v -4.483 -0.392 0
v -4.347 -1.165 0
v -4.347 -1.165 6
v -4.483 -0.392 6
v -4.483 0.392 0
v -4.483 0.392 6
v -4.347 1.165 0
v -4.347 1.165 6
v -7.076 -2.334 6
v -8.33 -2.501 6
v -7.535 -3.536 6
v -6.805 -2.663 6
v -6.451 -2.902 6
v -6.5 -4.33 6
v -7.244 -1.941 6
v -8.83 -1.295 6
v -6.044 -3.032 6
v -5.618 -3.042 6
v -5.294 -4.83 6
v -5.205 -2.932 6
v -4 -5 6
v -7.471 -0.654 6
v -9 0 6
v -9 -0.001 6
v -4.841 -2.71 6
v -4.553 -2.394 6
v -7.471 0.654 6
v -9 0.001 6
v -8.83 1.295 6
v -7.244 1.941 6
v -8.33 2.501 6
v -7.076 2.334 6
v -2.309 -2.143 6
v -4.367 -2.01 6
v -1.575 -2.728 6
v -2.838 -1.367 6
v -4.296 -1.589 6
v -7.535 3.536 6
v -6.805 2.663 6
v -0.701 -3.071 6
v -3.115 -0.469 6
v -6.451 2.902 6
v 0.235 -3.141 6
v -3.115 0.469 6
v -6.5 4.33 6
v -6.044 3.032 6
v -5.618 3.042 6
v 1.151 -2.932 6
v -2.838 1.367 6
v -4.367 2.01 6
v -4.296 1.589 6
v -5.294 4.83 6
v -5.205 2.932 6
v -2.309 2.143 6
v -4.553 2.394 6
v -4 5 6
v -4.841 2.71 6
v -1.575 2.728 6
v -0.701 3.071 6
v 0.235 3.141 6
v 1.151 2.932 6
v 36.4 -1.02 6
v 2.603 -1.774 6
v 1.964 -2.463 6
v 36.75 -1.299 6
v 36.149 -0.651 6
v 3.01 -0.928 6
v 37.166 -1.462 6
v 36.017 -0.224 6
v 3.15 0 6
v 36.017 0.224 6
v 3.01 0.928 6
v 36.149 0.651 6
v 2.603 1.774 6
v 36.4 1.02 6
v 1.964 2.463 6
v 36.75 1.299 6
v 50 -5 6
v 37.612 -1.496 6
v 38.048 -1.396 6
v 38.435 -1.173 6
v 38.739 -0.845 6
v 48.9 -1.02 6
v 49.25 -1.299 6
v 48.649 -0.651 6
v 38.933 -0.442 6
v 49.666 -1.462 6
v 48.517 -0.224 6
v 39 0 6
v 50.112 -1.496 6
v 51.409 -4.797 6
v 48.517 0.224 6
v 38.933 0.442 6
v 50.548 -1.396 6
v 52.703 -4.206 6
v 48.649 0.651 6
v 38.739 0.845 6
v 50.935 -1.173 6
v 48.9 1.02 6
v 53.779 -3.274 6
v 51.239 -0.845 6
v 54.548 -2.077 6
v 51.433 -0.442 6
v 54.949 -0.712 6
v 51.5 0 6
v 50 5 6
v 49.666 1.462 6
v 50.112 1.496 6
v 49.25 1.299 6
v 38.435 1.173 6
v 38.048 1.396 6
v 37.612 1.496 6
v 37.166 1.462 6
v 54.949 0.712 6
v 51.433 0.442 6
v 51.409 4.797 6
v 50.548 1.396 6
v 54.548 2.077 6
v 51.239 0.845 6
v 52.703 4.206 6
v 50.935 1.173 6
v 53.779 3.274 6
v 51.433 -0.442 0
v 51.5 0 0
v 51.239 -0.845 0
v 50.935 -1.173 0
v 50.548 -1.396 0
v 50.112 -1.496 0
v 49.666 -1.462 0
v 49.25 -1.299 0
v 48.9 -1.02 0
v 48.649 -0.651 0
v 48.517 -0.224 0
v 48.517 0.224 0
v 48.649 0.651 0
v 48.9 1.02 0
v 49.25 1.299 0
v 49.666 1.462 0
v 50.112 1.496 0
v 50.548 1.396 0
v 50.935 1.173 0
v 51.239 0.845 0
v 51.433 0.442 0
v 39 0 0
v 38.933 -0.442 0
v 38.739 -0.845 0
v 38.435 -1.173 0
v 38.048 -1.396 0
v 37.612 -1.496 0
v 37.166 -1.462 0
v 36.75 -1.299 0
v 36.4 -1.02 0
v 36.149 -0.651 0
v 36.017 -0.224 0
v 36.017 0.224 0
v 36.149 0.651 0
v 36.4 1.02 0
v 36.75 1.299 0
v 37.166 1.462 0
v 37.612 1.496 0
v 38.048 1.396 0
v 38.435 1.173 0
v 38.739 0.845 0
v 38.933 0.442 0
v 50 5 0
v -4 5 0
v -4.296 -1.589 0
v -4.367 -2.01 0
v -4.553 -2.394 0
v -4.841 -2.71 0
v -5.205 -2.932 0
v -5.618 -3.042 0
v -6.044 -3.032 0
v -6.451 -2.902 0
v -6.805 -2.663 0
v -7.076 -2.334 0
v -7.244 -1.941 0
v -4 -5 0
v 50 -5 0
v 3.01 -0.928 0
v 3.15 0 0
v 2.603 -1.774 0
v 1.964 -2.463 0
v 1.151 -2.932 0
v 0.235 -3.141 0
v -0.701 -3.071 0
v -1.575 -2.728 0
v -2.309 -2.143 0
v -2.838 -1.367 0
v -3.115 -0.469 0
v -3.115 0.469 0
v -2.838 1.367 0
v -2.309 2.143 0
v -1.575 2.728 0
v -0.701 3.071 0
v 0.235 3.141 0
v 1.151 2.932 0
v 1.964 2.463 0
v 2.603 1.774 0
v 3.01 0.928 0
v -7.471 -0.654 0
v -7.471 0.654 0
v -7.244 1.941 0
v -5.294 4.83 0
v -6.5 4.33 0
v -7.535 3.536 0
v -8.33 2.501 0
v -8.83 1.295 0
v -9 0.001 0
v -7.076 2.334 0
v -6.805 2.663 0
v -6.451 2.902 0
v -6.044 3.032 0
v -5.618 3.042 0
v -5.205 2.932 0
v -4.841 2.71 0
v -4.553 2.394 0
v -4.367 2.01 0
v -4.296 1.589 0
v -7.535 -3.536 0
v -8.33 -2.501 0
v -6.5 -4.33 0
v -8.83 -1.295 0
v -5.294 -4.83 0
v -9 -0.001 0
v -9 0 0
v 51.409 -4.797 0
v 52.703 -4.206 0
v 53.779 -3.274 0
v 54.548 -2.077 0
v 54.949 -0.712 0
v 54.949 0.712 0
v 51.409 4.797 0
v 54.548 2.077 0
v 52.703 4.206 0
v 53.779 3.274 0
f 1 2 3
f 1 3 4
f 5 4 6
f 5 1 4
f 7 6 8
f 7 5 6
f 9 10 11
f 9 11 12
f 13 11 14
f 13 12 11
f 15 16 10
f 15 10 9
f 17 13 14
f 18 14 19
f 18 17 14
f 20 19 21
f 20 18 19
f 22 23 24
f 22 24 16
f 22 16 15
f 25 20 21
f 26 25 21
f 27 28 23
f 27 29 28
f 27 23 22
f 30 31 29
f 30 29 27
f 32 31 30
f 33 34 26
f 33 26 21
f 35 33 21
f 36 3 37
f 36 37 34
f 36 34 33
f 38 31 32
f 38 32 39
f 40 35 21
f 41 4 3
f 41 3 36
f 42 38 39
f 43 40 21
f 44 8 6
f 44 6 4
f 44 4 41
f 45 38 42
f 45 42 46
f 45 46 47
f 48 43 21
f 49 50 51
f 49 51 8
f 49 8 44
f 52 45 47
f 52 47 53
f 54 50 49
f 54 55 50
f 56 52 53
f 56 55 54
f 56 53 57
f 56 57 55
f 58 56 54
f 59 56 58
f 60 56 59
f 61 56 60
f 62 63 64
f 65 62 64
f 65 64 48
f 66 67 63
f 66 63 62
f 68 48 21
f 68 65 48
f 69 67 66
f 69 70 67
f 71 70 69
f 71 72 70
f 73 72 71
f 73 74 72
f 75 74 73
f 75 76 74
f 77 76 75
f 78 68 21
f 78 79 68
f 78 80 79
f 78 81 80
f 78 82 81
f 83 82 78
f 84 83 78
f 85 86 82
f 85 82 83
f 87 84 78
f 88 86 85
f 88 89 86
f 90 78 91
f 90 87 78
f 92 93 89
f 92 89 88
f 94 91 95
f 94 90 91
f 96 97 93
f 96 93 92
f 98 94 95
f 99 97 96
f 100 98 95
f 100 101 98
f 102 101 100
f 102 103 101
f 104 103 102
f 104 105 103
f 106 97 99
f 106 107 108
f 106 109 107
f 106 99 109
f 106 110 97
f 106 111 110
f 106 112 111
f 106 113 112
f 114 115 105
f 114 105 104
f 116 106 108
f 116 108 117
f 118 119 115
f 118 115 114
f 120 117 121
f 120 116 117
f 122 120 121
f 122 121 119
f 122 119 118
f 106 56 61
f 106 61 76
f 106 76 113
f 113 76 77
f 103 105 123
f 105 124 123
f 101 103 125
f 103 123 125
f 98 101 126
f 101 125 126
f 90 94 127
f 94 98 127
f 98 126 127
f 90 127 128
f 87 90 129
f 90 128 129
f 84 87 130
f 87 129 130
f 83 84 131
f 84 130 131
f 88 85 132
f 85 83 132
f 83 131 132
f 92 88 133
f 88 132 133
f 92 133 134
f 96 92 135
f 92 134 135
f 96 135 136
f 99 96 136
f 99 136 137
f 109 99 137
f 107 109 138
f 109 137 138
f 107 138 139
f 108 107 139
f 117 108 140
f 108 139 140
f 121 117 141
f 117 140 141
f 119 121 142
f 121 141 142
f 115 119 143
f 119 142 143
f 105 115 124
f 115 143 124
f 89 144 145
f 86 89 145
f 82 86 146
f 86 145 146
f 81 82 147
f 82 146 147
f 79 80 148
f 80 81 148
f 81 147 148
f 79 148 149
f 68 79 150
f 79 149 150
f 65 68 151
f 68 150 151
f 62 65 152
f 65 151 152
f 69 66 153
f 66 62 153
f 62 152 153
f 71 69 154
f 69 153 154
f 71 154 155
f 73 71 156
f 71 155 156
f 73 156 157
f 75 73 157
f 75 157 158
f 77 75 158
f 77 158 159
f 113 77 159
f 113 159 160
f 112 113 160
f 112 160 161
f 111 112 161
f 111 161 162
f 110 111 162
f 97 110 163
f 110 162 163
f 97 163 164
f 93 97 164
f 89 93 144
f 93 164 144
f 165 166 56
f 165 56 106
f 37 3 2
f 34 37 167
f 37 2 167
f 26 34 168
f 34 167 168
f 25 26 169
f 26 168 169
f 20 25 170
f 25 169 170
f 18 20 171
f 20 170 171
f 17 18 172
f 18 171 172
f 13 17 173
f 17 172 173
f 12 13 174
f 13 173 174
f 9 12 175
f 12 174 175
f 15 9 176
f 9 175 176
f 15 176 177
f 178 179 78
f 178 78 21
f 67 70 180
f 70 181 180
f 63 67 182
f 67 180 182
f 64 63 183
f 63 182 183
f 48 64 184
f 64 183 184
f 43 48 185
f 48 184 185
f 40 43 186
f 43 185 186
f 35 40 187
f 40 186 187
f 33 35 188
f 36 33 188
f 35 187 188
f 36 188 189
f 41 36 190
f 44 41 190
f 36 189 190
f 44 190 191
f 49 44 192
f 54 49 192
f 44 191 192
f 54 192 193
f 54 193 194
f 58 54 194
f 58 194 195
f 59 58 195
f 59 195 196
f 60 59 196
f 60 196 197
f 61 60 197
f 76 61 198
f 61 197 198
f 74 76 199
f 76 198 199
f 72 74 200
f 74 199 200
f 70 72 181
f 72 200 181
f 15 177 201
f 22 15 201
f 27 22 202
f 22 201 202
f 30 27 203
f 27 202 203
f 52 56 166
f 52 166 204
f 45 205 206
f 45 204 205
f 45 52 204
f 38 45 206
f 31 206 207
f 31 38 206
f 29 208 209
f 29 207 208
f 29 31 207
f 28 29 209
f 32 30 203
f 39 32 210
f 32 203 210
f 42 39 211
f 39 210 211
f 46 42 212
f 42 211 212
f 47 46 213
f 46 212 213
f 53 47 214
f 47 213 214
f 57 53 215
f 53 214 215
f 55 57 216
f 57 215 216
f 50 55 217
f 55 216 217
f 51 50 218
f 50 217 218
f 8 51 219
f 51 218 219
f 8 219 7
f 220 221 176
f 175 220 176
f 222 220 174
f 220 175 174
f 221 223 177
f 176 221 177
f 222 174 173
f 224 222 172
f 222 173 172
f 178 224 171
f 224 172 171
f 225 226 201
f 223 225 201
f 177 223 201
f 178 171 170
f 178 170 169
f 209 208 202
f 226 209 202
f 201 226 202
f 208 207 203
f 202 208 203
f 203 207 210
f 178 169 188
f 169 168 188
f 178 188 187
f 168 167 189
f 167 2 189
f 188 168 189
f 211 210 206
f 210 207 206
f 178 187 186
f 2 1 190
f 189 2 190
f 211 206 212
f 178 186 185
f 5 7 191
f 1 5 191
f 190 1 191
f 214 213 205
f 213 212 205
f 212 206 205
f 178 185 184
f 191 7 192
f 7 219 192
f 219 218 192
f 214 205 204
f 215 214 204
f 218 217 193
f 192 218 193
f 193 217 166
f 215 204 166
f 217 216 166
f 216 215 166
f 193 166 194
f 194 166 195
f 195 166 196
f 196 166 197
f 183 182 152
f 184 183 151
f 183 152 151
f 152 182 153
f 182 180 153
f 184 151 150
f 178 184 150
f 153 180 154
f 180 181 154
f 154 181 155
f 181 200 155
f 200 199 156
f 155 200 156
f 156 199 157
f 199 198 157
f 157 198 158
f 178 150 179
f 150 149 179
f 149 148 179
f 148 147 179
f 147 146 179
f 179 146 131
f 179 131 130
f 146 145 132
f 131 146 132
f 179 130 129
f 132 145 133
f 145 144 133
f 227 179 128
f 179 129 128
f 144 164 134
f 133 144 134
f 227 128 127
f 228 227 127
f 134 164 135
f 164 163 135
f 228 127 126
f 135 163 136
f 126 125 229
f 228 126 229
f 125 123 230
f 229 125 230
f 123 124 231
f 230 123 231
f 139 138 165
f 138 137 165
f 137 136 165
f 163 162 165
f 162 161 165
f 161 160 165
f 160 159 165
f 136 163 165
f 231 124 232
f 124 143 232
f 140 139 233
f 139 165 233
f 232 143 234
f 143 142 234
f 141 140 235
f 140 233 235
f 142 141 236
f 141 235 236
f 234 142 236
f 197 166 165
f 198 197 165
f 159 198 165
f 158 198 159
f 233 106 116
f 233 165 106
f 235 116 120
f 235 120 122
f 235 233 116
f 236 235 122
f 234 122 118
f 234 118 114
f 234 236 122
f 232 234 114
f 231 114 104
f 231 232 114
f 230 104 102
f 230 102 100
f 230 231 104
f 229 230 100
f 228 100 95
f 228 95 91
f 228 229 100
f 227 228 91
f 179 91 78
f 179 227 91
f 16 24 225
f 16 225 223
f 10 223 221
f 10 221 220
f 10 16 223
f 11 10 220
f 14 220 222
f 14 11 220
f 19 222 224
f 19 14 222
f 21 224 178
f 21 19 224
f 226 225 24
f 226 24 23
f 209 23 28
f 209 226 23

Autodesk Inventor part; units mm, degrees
ref_plane "YZ Plane" through (0, 0, 0) normal (1, 0, 0) x (0, 1, 0)
ref_plane "XZ Plane" through (0, 0, 0) normal (0, 1, 0) x (-1, 0, 0)
ref_plane "XY Plane" through (0, 0, 0) normal (0, 0, 1) x (1, 0, 0)
sketch "Sketch1" plane through (0, 0, 0) normal (0, 0, 1) x (1, 0, 0)
  circle A0 centre (0, 0) radius 3.15
  line L0 (0, 0) -> (50, 0) construction
  line L1 (0, -9) -> (50, -9)
  line L2 (50, 9) -> (0, 9)
  arc A1 (0, 9) -> (0, -9) centre (0, 0) ccw
  arc A2 (50, -9) -> (50, 9) centre (50, 0) ccw
  line L3 (0, 0) -> (50, 0) construction
  circle A3 centre (50, 0) radius 1.5
  circle A4 centre (37.5, 0) radius 1.5
  circle A5 centre (-5.7956, -1.5529) radius 1.5
  circle A6 centre (-5.7956, 1.5529) radius 1.5
  line L4 (0, 0) -> (-5.7956, 1.5529) construction
  line L5 (0, 0) -> (-5.7956, -1.5529) construction
  line L6 (0, 0) -> (-9, 0) construction
  arc A7 (-4.3467, 1.1647) -> (-4.3467, -1.1647) centre (0, 0) ccw
  arc A8 (-7.2444, 1.9411) -> (-7.2444, -1.9411) centre (0, 0) ccw
  line L7 (-1.8674, 2.5368) -> (1.2741, 2.8808)
  point P0 (25, 0)
  dimension "d0" = 6.3
  dimension "d1" = 50
  dimension "d2" = 0
  dimension "d3" = 18
  dimension "d4" = 3
  dimension "d5" = 3
  dimension "d6" = 12.5
  dimension "d7" = 3
  dimension "d8" = 3
  dimension "d9" = 15
  dimension "d10" = 15
  dimension "d12" = 6
  dimension "d15" = 2.725
  dimension "d16" = -6.25
  dimension "d17" = 6
extrude "Extrusion1" add sketch "Sketch1" along normal blind 6
sketch "Sketch2" plane through (0, 0, 0) normal (0, 0, -1) x (-1, 0, 0)
  arc A0 (-50, 9) -> (-50, -9) centre (-50, 0) ccw projected
  line L0 (0, -9) -> (-50, -9) projected
  arc A1 (0, -9) -> (0, 9) centre (0, 0) ccw projected
  line L1 (-50, 9) -> (0, 9) projected
  circle A2 centre (-37.5, 0) radius 1.5 projected
  arc A3 (7.2444, -1.9411) -> (7.2444, 1.9411) centre (0, 0) ccw projected
  arc A4 (4.3467, -1.1647) -> (7.2444, -1.9411) centre (5.7956, -1.5529) ccw projected
  arc A5 (4.3467, -1.1647) -> (4.3467, 1.1647) centre (0, 0) ccw projected
  arc A6 (7.2444, 1.9411) -> (4.3467, 1.1647) centre (5.7956, 1.5529) ccw projected
  circle A7 centre (-50, 0) radius 1.5 projected
  circle A8 centre (0, 0) radius 3.15 projected
  line L2 (9, 5) -> (-59, 5)
  line L3 (-59, 5) -> (-59, -5)
  line L4 (-59, -5) -> (9, -5)
  line L5 (9, -5) -> (9, 5)
  circle A9 centre (-50, 0) radius 5
  point P0 (7.4833, -5)
  point P1 (-50, -5)
  point P2 (-50, 5)
  point P3 (7.4833, 5)
  dimension "d18" = 5
  dimension "d19" = 10
  dimension "d20" = 9
  dimension "d21" = 59
extrude "Extrusion2" cut sketch "Sketch2" against normal blind 6 contours L1 A1 L2 A0 | L2 A9 L4 A0 | L4 A1 L0 A0
fillet "Fillet1" radius 5 2 edges at (-7.4833, 5, 3) (-7.4833, -5, 3)
sketch "Sketch3" plane through (0, 0, 6) normal (0, 0, 1) x (1, 0, 0)
  circle A0 centre (0, 0) radius 3.15 projected
  circle A1 centre (50, 0) radius 1.5 projected
  arc A2 (-7.2444, 1.9411) -> (-7.2444, -1.9411) centre (0, 0) ccw projected
  arc A3 (-4.3467, 1.1647) -> (-7.2444, 1.9411) centre (-5.7956, 1.5529) ccw projected
  arc A4 (-4.3467, 1.1647) -> (-4.3467, -1.1647) centre (0, 0) ccw projected
  arc A5 (-7.2444, -1.9411) -> (-4.3467, -1.1647) centre (-5.7956, -1.5529) ccw projected
  circle A6 centre (37.5, 0) radius 1.5 projected
properties part number "Arm2_3D" material "Aluminum 6061, Welded"
